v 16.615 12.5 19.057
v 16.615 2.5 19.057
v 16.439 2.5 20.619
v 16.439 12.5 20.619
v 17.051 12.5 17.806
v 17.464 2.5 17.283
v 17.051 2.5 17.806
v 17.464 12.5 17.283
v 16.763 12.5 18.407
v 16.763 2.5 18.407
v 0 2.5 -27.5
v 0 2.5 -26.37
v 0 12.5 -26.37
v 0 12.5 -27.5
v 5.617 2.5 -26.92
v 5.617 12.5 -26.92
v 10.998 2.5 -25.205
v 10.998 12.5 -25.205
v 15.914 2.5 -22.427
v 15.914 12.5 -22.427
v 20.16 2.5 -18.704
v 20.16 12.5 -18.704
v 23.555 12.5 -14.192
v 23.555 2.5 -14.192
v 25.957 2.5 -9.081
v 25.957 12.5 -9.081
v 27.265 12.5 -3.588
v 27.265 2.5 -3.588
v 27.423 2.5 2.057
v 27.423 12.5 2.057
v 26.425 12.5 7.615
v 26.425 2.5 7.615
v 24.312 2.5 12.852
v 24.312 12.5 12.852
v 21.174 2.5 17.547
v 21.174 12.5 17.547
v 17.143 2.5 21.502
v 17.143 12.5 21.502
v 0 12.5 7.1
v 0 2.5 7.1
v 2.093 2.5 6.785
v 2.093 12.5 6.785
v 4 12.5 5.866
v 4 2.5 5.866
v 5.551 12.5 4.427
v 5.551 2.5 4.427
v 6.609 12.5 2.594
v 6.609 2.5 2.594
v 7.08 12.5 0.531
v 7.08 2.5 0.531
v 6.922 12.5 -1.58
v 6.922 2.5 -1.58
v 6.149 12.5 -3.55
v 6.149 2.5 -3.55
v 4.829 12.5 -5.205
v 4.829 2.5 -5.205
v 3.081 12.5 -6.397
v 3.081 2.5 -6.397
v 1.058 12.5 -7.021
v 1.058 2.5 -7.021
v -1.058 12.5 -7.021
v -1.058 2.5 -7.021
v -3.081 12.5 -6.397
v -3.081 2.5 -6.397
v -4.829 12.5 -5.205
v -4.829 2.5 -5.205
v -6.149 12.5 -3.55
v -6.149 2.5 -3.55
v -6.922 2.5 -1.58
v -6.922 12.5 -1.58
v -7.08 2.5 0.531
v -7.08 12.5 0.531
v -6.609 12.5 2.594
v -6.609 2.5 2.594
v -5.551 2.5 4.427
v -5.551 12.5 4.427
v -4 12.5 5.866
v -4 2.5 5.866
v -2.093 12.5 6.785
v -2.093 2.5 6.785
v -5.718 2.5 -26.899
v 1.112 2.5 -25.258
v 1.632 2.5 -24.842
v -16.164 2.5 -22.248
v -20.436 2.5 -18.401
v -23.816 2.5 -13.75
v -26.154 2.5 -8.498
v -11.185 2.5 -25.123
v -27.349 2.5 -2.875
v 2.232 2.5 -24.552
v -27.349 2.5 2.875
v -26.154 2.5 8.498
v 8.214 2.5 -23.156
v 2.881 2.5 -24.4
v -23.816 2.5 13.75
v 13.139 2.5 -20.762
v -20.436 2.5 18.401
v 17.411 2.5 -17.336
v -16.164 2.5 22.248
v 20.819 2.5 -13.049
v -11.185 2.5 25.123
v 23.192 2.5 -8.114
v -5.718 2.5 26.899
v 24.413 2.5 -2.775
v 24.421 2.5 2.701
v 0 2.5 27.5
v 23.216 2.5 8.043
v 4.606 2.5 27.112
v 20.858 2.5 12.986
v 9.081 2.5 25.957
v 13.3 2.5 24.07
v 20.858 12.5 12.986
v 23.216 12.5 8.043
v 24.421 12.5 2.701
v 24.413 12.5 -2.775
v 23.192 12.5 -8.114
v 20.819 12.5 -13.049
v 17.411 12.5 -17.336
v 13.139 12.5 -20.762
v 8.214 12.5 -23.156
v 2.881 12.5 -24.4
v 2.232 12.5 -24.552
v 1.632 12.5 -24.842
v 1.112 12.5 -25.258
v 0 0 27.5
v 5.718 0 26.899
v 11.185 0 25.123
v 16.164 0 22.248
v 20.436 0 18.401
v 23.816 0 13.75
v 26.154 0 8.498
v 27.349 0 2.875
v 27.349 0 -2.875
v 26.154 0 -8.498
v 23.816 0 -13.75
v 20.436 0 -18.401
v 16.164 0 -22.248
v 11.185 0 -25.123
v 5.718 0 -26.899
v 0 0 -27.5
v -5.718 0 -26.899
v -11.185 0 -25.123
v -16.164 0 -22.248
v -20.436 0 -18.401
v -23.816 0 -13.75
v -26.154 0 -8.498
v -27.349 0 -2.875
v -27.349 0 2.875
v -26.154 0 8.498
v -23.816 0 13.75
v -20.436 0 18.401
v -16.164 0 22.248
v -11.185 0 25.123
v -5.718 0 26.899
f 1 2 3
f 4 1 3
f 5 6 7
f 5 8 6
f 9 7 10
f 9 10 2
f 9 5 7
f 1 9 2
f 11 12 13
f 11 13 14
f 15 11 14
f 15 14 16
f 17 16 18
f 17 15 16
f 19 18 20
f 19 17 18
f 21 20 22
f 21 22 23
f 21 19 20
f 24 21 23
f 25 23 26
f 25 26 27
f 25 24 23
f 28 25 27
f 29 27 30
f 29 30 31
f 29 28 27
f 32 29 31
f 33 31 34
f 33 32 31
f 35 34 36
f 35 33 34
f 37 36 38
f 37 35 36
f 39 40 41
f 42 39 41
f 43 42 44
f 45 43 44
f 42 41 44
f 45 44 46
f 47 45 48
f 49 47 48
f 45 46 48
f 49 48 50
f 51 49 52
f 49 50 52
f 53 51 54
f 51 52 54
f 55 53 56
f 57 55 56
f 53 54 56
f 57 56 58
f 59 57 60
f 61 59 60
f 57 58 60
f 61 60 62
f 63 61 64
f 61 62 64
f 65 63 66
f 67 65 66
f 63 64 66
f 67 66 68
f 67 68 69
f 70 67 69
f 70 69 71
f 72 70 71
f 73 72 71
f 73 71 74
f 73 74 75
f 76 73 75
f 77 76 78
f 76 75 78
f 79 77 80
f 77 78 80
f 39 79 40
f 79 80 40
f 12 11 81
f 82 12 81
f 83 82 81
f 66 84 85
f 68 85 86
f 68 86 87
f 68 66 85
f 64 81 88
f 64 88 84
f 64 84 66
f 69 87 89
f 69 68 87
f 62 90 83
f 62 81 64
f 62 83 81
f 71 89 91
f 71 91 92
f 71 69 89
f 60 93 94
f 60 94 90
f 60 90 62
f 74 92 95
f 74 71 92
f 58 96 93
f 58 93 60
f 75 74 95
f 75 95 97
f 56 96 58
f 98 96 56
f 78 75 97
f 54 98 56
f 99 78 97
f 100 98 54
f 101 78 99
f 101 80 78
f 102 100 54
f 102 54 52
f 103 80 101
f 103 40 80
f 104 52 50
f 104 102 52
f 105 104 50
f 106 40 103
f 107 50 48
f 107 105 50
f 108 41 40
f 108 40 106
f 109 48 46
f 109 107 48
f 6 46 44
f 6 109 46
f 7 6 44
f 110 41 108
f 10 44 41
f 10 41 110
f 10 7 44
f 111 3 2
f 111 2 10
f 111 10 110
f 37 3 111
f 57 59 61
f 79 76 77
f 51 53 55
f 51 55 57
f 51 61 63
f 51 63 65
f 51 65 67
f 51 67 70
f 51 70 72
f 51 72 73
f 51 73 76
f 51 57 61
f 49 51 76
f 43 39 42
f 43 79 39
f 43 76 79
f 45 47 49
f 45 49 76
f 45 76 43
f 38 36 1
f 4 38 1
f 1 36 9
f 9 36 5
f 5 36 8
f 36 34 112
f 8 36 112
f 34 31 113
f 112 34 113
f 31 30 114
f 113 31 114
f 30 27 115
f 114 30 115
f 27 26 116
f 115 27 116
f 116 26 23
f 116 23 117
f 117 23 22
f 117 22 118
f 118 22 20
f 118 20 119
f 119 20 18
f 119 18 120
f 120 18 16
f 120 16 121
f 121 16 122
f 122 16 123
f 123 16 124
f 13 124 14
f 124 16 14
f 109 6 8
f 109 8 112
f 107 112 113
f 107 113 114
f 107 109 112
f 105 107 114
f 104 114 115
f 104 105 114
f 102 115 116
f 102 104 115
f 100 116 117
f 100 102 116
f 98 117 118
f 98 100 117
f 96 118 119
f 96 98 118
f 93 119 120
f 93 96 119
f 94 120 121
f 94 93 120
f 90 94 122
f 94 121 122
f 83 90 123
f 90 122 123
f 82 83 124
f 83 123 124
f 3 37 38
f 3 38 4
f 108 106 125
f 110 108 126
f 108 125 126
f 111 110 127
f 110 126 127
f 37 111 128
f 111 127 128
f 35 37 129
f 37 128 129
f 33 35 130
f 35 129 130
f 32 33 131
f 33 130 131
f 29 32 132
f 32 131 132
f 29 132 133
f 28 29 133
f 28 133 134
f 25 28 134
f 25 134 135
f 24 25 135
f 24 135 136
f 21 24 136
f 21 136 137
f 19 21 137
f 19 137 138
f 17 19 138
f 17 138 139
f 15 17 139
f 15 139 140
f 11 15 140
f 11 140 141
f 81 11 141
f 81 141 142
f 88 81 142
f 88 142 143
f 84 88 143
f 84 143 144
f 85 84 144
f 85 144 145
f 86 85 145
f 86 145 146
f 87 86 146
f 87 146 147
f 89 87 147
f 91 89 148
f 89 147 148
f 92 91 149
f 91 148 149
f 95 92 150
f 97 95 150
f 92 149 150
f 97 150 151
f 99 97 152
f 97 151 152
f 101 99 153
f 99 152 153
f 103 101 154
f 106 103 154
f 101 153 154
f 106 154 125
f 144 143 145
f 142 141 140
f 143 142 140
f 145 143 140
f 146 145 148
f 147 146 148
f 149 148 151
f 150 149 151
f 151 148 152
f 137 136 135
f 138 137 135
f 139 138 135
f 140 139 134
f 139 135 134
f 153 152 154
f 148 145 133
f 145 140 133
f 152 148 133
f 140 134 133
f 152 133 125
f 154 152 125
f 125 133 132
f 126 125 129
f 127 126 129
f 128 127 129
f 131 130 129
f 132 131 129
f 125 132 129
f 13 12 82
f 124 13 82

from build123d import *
from build123d.topology import SkipClean

# Parameters (mm, degrees)
SKETCH1_R           = 27.5
BOSS_EXTRUDE1_DEPTH = 2.5
SKETCH2_R           = 7.1
BOSS_EXTRUDE2_DEPTH = 10
BOSS_EXTRUDE3_DEPTH = 10
CHAMFER1_SIZE       = 1.8
FILLET2_R           = 3


with BuildPart() as part:
    # Sketch1 → Boss-Extrude1 (new body)
    with BuildSketch(Plane(origin=(0, 0, 0), x_dir=(1, 0, 0), z_dir=(0, 1, 0))):
        with Locations(Location((0, 0, 0), (0, 0, 270))):
            Circle(SKETCH1_R)
    extrude(amount=BOSS_EXTRUDE1_DEPTH)

    # Sketch2 → Boss-Extrude2 (add)
    with BuildSketch(Plane(origin=(0, 2.5, 0), x_dir=(1, 0, 0), z_dir=(0, 1, 0))):
        with Locations(Location((0, 0, 0), (0, 0, 270))):
            Circle(SKETCH2_R)
    extrude(amount=BOSS_EXTRUDE2_DEPTH)

    # Sketch5 → Boss-Extrude3 (add)
    with SkipClean():  # the faces are left unmerged after this step: merging them gives an invalid solid
        with BuildSketch(Plane(origin=(0, 2.5, 0), x_dir=(1, 0, 0), z_dir=(0, 1, 0))):
            with BuildLine():
                Line((0, 24.57), (0, 27.5))
                ThreePointArc((0, 27.5), (25.957349719, 9.081078988), (17.143326771, -21.502473049))
                Line((17.143326771, -21.502473049), (15.316783228, -19.211482284))
                ThreePointArc((15.316783228, -19.211482284), (23.191712094, 8.113531299), (0, 24.57))
            make_face()
        extrude(amount=BOSS_EXTRUDE3_DEPTH)

    # Chamfer1
    # the kernel refuses this chamfer: 1.8 mm, written as the material it takes off along each edge
    with BuildSketch(Plane(origin=(0, 2.5, -24.57), x_dir=(0, 0, -1), z_dir=(0, 1, 0))) as chamfer1_piece_1:
        with BuildLine():
            Line((CHAMFER1_SIZE, 0), (-0.071369946, -1.871369946))
            ThreePointArc((-0.071369946, -1.871369946), (-0.018871327, -0.96279846), (0, 0))
            Line((0, 0), (CHAMFER1_SIZE, 0))
        make_face()
    extrude(amount=14.815417609, mode=Mode.SUBTRACT)
    with BuildSketch(Plane(origin=(15.316783228, 2.5, 19.211482284), x_dir=(0.7575824934147944, 0, -0.652739431681144), z_dir=(0, 1, 0))) as chamfer1_piece_2:
        with BuildLine():
            Line((1.872730398, 0), (-CHAMFER1_SIZE * 0.0381101017104, -CHAMFER1_SIZE * 0.999273546206))
            Line((-CHAMFER1_SIZE * 0.0381101017104, -CHAMFER1_SIZE * 0.999273546206), (0, 0))
            ThreePointArc((0, 0), (0.962818219, -0.01783473), (1.872730398, 0))
        make_face()
    extrude(amount=14.815417609, mode=Mode.SUBTRACT)

    # Fillet2
    fillet2_edges = [part.edges().sort_by_distance(p)[0] for p in [
        (1.871369946, 7.5, -24.498630054),
        (16.735530992, 7.5, 17.989077308),
    ]]
    fillet(fillet2_edges, radius=FILLET2_R)


solid = part.part
